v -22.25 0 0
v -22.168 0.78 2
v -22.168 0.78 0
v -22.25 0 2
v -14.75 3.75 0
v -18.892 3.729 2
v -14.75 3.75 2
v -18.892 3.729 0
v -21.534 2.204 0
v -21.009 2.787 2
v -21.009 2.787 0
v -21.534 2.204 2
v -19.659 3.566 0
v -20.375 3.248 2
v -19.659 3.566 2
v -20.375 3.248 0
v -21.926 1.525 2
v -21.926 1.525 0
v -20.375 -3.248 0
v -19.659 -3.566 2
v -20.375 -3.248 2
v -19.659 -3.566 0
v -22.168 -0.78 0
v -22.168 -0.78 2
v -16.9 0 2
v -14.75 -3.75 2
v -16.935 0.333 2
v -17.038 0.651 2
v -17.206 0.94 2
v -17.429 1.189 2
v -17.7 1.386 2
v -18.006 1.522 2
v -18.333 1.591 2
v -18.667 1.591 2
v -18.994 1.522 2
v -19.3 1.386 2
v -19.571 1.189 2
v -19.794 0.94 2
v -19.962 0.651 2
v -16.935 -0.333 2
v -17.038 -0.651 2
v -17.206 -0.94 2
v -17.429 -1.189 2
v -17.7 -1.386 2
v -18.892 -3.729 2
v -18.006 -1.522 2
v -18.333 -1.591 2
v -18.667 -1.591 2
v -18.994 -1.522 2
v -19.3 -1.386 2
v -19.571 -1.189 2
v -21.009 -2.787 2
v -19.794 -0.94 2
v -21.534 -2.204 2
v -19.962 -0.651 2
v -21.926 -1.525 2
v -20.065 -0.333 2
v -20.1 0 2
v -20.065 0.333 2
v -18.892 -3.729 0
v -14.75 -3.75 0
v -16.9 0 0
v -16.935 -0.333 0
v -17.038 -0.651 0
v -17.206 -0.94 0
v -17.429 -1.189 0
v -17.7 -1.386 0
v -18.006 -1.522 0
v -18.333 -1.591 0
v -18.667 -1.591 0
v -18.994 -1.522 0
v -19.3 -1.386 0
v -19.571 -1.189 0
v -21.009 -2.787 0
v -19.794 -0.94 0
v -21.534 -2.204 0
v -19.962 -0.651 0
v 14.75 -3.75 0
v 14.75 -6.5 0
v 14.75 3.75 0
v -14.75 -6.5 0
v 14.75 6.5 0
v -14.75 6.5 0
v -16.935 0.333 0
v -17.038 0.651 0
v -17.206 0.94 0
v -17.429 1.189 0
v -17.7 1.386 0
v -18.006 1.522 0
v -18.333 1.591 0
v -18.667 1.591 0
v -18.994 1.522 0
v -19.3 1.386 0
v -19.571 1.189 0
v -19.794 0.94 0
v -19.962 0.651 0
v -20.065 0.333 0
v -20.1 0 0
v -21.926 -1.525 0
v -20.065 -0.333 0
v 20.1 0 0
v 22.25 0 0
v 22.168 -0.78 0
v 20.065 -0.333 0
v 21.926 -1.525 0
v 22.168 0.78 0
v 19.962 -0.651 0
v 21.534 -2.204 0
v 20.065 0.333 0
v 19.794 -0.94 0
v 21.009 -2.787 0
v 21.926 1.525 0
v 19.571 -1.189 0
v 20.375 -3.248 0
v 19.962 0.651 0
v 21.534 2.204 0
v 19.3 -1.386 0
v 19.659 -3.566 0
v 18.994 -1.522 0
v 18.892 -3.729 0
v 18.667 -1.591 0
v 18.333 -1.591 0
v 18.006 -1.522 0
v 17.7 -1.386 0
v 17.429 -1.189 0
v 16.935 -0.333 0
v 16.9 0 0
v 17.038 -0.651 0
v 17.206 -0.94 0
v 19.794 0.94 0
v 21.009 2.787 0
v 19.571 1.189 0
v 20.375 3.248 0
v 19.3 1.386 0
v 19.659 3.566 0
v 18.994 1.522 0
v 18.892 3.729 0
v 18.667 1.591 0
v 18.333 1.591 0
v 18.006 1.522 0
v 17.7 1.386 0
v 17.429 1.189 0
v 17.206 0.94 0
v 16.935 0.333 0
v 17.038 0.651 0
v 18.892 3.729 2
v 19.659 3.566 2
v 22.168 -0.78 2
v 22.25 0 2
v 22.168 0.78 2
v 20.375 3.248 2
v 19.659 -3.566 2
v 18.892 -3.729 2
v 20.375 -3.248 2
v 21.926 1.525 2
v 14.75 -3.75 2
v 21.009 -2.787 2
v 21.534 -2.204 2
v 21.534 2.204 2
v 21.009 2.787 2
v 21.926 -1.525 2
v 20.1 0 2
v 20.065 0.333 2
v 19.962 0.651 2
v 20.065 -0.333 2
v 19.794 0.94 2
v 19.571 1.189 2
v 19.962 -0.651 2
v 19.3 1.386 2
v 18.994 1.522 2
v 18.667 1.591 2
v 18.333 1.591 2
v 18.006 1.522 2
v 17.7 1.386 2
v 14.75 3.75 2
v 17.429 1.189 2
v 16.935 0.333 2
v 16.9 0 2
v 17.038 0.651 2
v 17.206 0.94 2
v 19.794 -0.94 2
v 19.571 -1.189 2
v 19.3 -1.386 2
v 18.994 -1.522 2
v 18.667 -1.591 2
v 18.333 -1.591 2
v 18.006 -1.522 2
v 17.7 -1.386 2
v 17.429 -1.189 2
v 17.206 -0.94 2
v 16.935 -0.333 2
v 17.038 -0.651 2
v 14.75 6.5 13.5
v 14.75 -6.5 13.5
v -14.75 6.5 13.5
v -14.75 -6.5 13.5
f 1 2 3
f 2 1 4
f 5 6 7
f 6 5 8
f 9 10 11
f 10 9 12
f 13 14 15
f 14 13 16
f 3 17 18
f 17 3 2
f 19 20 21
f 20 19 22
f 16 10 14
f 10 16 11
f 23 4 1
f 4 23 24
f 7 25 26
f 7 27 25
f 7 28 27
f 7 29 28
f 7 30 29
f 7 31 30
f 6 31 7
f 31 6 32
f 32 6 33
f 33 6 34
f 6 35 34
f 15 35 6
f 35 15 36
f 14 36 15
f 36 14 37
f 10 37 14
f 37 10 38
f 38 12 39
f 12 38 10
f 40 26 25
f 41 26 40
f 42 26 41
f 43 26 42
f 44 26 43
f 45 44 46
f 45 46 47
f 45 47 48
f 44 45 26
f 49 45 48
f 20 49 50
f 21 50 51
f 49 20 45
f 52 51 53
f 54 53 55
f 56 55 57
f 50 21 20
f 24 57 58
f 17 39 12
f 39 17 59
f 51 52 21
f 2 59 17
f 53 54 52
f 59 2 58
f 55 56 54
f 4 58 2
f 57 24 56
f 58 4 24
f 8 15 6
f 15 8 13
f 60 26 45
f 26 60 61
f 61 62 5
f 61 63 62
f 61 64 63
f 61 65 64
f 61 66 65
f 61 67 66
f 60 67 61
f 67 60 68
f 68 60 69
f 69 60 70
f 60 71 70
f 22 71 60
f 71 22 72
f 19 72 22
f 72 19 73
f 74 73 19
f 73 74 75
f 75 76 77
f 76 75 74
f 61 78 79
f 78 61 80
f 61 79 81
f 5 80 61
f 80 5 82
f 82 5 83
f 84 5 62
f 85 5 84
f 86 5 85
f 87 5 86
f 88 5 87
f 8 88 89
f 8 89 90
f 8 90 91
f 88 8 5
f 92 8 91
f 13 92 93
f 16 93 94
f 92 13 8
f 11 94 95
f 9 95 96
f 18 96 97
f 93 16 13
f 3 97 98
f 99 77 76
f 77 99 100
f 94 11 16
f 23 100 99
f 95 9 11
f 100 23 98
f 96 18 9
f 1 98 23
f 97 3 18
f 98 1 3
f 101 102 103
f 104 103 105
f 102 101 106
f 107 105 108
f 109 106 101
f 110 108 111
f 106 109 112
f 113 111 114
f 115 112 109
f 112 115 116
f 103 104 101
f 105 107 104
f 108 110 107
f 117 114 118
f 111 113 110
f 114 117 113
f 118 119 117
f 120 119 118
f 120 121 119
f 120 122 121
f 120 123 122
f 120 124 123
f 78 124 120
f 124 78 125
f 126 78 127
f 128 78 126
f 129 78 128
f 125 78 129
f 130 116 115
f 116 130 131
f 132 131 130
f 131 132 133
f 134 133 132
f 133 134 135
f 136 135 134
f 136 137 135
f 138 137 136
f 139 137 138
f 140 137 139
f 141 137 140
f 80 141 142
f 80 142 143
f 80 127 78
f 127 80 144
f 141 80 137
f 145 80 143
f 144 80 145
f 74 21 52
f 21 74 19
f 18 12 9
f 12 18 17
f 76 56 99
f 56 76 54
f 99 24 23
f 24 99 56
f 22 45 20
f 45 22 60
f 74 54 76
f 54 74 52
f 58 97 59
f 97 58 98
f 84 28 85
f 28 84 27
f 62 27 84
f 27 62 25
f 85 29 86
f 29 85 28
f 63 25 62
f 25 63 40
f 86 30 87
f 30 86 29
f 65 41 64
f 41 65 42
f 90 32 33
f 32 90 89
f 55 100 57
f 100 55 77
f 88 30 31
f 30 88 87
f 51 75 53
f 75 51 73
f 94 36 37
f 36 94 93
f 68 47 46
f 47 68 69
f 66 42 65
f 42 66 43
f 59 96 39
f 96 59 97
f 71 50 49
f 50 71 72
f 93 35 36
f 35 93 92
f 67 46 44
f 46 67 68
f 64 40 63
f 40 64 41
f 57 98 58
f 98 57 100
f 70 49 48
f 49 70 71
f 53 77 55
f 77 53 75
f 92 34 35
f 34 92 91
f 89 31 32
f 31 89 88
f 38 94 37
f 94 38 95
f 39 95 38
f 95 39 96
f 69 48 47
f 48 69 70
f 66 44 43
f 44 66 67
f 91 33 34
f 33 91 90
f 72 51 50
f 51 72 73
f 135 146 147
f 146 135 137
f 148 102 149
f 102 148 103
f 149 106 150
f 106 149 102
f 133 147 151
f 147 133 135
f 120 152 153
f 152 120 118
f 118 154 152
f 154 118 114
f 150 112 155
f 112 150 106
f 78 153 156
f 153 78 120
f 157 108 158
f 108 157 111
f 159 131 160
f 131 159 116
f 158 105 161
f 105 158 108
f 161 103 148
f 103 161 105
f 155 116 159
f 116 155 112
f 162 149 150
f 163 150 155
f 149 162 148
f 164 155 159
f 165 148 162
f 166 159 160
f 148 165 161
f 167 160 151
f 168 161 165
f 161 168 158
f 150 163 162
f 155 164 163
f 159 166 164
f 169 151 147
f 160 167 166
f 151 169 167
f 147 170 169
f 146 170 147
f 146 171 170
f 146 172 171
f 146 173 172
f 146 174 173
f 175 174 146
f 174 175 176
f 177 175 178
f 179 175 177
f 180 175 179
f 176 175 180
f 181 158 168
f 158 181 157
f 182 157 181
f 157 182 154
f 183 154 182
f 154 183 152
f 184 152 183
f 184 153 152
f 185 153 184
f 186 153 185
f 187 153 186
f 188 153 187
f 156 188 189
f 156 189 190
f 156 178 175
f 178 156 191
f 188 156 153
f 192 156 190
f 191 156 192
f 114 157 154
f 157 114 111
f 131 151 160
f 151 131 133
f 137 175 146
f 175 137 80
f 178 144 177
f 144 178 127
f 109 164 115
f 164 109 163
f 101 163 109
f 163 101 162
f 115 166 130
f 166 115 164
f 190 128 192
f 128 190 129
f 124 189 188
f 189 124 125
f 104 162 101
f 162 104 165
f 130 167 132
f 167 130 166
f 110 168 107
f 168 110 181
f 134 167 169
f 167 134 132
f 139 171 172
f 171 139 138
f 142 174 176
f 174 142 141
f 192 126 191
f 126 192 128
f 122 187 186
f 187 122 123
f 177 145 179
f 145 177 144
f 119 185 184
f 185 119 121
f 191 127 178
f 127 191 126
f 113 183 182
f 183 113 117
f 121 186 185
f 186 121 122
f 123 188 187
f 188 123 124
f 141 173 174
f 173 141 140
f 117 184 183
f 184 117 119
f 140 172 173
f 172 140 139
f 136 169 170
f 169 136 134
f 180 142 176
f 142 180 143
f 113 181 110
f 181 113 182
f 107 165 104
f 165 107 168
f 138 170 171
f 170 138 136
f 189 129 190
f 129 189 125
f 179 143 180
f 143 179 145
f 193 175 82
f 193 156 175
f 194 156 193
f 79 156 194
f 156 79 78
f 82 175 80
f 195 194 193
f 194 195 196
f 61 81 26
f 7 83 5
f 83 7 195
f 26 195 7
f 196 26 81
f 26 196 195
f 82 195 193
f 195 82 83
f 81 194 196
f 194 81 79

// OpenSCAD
// file: params_infrared_sensors.scad
// Author: Mihai Oltean, www.tcreate.org, mihai.oltean@gmail.com
// More details: jenny5.org
// Source: github.com/jenny5-robot
// MIT License
//--------------------------------------------------------------

GP2Y0D805Z0F_size = [22, 9, 10];

GP2Y0D805_size = [13.6, 7, 7.96];

GP2Y0D805Z0F_dist_to_hole = 2.54;

GP2Y0A41SK0F_size = [29.5, 13, 13.5];

GP2Y0A41SK0F_ear_radius = 3.75;

GP2Y0A41SK0F_ear_hole_radius = 1.6;
// file: params_basic_components.scad
// Author: Mihai Oltean, www.tcreate.org, mihai.oltean@gmail.com
// More details: jenny5.org
// Source: github.com/jenny5-robot
// MIT License
//--------------------------------------------------------------

spring_length = 20;

smooth_rod_8_radius = 4;
smooth_rod_10_radius = 5;
smooth_rod_12_radius = 6;

tolerance = 0.1;
display_tolerance = 1;

overlap_tolerance = 0.01;


wall_thick_1 = 1;
wall_thick_2 = 2;
wall_thick_3 = 3;
wall_thick_4 = 4;
wall_thick_5 = 5;
wall_thick_5_5 = 5.5;
wall_thick_6 = 6;
wall_thick_7 = 7;
wall_thick_8 = 8;
wall_thick_9 = 9;
wall_thick_10 = 10;
wall_thick_12 = 10;

wrench_radius = 11;

ghidaj_radius = 4;
ghidaj_radius_12 = 6;

canal_diameter = 8.22;
canal_height = 2.2;

filament_radius = 0.9;

bowden_tube_radius = 2.5;

m3_tolerance = 0.1;

latura_mare_L = 40;
latura_mica_L = 15;
grosime_perete_L = 3;

latura_L_50x50 = 50;
latura_L_40x40 = 40;

latura_U_50x50 = 50;
latura_U_40x40 = 40;


tolerance_z = [0, 0, tolerance];
tolerance_x = [tolerance, 0, 0];
tolerance_y = [0, tolerance, 0];

display_tolerance_z = [0, 0, display_tolerance];
display_tolerance_x = [display_tolerance, 0, 0];
display_tolerance_y = [0, display_tolerance, 0];

display_tolerance_xz = [display_tolerance, 0, display_tolerance];
display_tolerance_xy = [display_tolerance, display_tolerance, 0];
display_tolerance_yz = [0, display_tolerance, display_tolerance];

display_tolerance_xyz = [display_tolerance, display_tolerance, display_tolerance];
// main file
// Author: Mihai Oltean, www.tcreate.org, mihai.oltean@gmail.com
// More details: jenny5.org
// Source: github.com/jenny5-robot
// MIT License
//--------------------------------------------------------------

include <params_basic_components.scad>
include <params_infrared_sensors.scad>

//------------------------------------------------------
module GP2Y0D805Z0F()
{
    difference(){
        color("green") cube([GP2Y0D805Z0F_size[0], GP2Y0D805Z0F_size[1], 2]);
        // screw hole
        translate([GP2Y0D805Z0F_size[0] - GP2Y0D805Z0F_dist_to_hole, GP2Y0D805Z0F_size[1] / 2, 0] - display_tolerance_z) cylinder (h = 2 + 2 * display_tolerance, r = 1, $fn = 10);
    }
    translate([3, -GP2Y0D805_size[1] / 2 + GP2Y0D805Z0F_size[1] / 2, 2]) color("black") cube(GP2Y0D805_size);
}
//------------------------------------------------------
module GP2Y0A41SK0F()
{
    translate (-[GP2Y0A41SK0F_size[0] / 2, GP2Y0A41SK0F_size[1] / 2, 0]) cube(GP2Y0A41SK0F_size);
    // ears
    difference(){
        hull(){
            translate (-[GP2Y0A41SK0F_size[0] / 2, 0, 0] - [GP2Y0A41SK0F_ear_radius, 0, 0]) cylinder (h = 2, r = GP2Y0A41SK0F_ear_radius, $fn = 30);
            translate (-[GP2Y0A41SK0F_size[0] / 2, 0, 0]) cylinder (h = 2, r = GP2Y0A41SK0F_ear_radius);
        }
        translate (-[GP2Y0A41SK0F_size[0] / 2, 0, 0] - [GP2Y0A41SK0F_ear_radius, 0, 0] - display_tolerance_z) cylinder (h = 2 + 2 * display_tolerance, r = GP2Y0A41SK0F_ear_hole_radius, $fn = 30);
    }
    difference(){
        hull(){
          translate ([GP2Y0A41SK0F_size[0] / 2, 0, 0] + [GP2Y0A41SK0F_ear_radius, 0, 0]) cylinder (h = 2, r = GP2Y0A41SK0F_ear_radius, $fn = 30);
          translate ([GP2Y0A41SK0F_size[0] / 2, 0, 0]) cylinder (h = 2, r = GP2Y0A41SK0F_ear_radius);
        }
          translate ([GP2Y0A41SK0F_size[0] / 2, 0, 0] + [GP2Y0A41SK0F_ear_radius, 0, 0] - display_tolerance_z) cylinder (h = 2 + 2 * display_tolerance, r = GP2Y0A41SK0F_ear_hole_radius, $fn = 30);        
    }
}
//------------------------------------------------------

GP2Y0A41SK0F ();

//GP2Y0D805Z0F();
